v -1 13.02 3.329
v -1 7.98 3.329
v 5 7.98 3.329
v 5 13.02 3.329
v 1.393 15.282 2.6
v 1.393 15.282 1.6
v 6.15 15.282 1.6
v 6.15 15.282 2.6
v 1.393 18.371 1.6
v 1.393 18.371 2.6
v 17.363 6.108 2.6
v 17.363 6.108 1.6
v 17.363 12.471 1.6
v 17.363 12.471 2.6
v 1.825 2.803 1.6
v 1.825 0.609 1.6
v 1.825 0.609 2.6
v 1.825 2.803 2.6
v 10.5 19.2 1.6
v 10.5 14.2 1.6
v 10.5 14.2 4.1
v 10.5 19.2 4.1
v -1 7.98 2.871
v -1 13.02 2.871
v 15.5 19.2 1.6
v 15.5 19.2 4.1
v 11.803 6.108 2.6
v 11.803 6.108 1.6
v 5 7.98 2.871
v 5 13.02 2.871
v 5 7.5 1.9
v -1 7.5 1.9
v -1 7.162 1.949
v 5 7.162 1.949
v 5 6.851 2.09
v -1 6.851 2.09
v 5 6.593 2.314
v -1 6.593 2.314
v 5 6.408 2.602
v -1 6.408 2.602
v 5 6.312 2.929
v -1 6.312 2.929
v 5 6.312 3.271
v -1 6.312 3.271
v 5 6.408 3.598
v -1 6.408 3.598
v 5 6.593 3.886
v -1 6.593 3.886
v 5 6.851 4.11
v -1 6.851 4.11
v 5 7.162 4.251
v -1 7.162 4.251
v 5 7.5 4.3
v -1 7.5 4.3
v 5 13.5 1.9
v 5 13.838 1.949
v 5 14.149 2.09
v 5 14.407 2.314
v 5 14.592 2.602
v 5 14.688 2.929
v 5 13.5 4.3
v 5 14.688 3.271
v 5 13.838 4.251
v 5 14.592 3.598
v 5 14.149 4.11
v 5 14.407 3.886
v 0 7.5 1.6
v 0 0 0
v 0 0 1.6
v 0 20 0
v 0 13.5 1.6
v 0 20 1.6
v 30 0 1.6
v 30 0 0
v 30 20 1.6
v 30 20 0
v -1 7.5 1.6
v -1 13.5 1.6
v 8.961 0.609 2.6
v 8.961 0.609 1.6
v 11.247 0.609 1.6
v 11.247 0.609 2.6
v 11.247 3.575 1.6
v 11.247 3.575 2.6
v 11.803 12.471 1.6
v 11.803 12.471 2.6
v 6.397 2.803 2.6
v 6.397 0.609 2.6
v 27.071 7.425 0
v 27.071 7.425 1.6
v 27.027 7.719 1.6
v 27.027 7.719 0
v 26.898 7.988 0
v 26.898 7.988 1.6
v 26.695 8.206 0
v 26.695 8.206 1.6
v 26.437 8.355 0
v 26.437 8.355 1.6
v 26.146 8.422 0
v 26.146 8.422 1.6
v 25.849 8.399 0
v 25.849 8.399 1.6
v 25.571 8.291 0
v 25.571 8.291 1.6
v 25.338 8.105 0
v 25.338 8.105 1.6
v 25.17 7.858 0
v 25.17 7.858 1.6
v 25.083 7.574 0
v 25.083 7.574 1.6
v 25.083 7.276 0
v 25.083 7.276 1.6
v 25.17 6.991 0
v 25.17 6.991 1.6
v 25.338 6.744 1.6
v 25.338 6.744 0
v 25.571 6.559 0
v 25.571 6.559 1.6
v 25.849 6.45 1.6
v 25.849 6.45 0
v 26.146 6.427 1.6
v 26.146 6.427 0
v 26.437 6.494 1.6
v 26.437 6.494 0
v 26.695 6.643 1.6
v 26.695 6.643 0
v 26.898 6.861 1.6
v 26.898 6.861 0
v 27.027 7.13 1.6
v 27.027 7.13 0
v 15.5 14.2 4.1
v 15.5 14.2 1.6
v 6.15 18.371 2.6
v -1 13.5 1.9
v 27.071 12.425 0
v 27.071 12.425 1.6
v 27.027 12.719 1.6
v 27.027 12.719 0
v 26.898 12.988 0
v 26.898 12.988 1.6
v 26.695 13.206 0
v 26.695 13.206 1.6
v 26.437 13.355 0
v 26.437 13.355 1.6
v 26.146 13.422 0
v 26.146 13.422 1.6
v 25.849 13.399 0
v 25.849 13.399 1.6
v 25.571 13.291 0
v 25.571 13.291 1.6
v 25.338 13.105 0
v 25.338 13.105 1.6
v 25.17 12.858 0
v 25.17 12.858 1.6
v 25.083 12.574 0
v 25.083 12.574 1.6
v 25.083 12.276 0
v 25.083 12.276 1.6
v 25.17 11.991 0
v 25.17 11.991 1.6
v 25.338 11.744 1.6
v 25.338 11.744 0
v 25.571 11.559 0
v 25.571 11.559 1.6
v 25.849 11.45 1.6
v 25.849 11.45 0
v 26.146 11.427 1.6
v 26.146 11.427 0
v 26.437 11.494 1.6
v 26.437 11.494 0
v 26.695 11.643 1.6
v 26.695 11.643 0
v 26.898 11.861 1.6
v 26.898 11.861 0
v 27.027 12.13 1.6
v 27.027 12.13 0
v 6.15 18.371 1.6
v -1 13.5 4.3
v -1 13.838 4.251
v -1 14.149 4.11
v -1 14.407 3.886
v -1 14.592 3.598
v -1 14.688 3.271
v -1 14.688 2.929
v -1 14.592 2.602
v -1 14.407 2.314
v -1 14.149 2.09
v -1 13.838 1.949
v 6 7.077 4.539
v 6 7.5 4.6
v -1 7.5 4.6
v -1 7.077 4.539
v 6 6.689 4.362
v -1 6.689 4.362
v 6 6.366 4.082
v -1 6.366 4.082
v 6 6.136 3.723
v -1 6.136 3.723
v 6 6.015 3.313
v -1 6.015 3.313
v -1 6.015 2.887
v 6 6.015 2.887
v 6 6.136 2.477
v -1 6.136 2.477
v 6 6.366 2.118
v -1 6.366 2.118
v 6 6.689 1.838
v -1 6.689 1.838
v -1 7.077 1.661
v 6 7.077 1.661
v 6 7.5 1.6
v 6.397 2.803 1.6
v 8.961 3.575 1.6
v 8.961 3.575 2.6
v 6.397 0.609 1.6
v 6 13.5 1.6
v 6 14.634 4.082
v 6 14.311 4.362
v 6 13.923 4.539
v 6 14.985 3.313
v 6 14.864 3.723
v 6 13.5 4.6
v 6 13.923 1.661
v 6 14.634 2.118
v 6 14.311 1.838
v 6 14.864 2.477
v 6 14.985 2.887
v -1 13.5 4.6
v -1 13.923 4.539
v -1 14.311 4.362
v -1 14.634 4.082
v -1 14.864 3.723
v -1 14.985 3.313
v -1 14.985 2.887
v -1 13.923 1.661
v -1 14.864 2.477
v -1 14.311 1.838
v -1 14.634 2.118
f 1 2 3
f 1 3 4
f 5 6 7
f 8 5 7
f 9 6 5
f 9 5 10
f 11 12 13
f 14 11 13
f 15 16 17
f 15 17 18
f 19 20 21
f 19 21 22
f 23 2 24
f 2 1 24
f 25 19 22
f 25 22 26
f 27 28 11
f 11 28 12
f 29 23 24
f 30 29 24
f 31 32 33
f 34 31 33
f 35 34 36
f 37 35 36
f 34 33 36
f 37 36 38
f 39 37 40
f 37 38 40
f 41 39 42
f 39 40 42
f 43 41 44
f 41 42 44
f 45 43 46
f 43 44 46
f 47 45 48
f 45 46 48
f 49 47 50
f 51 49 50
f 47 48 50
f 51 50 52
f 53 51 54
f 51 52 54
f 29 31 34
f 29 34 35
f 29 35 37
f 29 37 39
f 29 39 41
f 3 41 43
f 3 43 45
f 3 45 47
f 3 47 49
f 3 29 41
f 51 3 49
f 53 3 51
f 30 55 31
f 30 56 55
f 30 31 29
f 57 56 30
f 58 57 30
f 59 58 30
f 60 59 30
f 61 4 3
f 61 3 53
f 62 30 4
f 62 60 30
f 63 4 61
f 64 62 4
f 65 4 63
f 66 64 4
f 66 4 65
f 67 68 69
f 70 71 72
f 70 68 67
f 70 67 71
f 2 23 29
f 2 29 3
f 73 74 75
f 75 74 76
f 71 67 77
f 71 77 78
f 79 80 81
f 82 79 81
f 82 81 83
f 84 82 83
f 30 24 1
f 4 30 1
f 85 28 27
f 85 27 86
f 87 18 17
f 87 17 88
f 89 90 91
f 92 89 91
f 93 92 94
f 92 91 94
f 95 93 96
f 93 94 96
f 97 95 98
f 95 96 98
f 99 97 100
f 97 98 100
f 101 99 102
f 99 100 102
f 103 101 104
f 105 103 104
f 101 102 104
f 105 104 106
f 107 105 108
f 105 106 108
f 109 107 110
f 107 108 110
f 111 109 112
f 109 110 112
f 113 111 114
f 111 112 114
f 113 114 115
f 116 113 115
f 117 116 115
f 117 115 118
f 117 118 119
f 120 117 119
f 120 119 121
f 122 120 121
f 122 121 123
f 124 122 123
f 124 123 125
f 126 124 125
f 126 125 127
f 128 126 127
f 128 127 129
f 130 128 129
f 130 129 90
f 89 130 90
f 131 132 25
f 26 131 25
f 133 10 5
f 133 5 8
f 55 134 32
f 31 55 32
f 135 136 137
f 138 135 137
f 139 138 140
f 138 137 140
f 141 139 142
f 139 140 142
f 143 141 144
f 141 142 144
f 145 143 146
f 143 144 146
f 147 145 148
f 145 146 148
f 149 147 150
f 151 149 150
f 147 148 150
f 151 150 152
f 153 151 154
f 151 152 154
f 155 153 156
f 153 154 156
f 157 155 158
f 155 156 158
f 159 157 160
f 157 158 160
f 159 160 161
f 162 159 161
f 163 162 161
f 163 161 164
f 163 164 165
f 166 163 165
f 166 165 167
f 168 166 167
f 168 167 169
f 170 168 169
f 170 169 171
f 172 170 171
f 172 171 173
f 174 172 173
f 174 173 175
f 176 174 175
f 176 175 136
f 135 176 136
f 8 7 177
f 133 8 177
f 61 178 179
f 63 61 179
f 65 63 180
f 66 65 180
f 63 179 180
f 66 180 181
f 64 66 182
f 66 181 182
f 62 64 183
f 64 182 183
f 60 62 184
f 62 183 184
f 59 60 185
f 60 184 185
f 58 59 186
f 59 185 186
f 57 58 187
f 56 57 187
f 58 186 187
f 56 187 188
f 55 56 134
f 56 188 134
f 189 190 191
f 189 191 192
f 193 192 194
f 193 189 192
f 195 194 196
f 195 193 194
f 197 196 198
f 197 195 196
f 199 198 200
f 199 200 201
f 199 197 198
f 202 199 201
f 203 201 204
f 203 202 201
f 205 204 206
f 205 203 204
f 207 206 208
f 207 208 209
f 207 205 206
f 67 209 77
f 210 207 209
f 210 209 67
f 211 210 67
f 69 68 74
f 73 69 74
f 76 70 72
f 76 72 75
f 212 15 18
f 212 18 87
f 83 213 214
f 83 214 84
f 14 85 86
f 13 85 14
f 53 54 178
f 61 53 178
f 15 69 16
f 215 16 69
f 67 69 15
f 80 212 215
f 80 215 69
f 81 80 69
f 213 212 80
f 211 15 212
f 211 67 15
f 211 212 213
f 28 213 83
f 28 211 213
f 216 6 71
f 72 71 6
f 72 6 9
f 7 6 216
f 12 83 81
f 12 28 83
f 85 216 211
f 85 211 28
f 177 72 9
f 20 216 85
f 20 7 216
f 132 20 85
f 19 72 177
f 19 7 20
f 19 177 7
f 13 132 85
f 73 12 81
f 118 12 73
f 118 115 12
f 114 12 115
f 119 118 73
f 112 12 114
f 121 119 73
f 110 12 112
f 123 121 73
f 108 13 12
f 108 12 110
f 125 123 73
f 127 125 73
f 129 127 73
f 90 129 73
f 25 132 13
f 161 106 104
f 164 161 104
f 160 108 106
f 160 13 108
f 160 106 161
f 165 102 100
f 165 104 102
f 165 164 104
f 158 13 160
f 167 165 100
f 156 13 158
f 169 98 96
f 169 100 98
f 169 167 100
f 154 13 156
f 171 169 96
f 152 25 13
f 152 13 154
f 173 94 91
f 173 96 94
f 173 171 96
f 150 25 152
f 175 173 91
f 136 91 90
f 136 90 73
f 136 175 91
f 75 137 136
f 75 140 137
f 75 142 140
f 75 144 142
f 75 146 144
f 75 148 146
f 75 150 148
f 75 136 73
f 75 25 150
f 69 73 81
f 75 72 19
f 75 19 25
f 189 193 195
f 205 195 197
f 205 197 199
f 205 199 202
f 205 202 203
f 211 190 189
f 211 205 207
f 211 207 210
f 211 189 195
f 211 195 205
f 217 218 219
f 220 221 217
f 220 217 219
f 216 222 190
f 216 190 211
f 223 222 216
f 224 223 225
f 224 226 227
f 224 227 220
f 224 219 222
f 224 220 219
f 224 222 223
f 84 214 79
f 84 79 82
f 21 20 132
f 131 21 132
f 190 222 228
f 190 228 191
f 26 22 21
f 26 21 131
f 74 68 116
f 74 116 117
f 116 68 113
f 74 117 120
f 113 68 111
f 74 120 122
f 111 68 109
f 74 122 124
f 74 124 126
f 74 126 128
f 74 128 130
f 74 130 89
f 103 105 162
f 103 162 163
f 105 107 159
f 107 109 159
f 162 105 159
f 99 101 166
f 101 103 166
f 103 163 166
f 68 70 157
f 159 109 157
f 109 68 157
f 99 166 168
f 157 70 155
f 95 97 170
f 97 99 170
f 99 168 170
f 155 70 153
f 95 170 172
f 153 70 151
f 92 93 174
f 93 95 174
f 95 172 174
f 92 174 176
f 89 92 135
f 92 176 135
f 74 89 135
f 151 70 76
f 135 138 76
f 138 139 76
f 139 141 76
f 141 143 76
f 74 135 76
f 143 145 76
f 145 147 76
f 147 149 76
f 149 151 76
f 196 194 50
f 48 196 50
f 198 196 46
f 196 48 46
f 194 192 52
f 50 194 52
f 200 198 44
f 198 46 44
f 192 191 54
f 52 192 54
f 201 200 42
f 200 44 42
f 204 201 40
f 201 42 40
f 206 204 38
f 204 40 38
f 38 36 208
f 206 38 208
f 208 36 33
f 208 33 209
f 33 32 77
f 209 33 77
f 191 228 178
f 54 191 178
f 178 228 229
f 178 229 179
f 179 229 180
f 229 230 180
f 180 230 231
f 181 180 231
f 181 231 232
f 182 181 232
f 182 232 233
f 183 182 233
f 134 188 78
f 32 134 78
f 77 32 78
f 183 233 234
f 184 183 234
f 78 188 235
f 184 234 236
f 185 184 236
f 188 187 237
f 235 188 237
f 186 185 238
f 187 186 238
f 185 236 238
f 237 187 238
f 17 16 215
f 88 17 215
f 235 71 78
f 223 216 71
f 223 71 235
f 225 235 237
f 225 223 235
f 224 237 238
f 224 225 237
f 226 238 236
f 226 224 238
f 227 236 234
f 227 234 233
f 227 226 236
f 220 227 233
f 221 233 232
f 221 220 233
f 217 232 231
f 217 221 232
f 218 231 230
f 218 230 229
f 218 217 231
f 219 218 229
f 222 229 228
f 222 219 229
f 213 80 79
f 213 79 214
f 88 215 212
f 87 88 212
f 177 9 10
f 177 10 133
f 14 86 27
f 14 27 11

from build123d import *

# Parameters (mm, degrees)
SKICA1_W                     = 30
SKICA1_H                     = 20
P_IDAT_VYSUNUT_M1_DEPTH      = 1.6
SKICA2_W                     = 5
SKICA2_H                     = 5
P_IDAT_VYSUNUT_M2_DEPTH      = 2.5
SKICA3_W                     = 5.560208965
SKICA3_H                     = 6.363350261
SKICA3_W_2                   = 2.285863686
SKICA3_H_2                   = 2.965444781
SKICA3_W_3                   = 4.571727371
SKICA3_H_3                   = 2.193193536
SKICA3_W_4                   = 4.75706767
SKICA3_H_4                   = 3.089004981
P_IDAT_VYSUNUT_M3_DEPTH      = 1
SKICA4_R                     = 1
ODEBRAT_VYSUNUT_M1_DEPTH     = 11
P_IDAT_VYSUNUT_M4_DEPTH      = 1
P_IDAT_VYSUNUT_M4_DEPTH_BACK = 6
SKICA6_W                     = 0.458188224
SKICA6_H                     = 5.040283318
ODEBRAT_VYSUNUT_M2_DEPTH     = 6


with BuildPart() as part:
    # Skica1 → Přidat vysunutím1 (new body)
    with BuildSketch(Plane.XY):
        with Locations((15, 10)):
            Rectangle(SKICA1_W, SKICA1_H)
    extrude(amount=P_IDAT_VYSUNUT_M1_DEPTH)

    # Skica2 → Přidat vysunutím2 (add)
    with BuildSketch(Plane.XY.offset(1.6)):
        with Locations((13, 16.7)):
            Rectangle(SKICA2_W, SKICA2_H)
    extrude(amount=P_IDAT_VYSUNUT_M2_DEPTH)

    # Skica3 → Přidat vysunutím3 (add)
    with BuildSketch(Plane.XY.offset(1.6)):
        with Locations((14.582984328, 9.289528855)):
            Rectangle(SKICA3_W, SKICA3_H)
        with Locations((10.103927106, 2.092147249)):
            Rectangle(SKICA3_W_2, SKICA3_H_2)
        with Locations((4.111257444, 1.706021627)):
            Rectangle(SKICA3_W_3, SKICA3_H_3)
        with Locations((3.771466895, 16.826701007)):
            Rectangle(SKICA3_W_4, SKICA3_H_4)
    extrude(amount=P_IDAT_VYSUNUT_M3_DEPTH)

    # Skica4 → Odebrat vysunutím1 (cut)
    with BuildSketch(Plane.XY.offset(1.6)):
        with Locations((26.071400283, 12.424560679)):
            Circle(SKICA4_R)
        with Locations((26.071400283, 7.424560679)):
            Circle(SKICA4_R)
    extrude(amount=-ODEBRAT_VYSUNUT_M1_DEPTH, mode=Mode.SUBTRACT)

    # Skica5 → Přidat vysunutím4 (add, two sides: drawn at the far end of the back side and taken through both)
    with BuildSketch(Plane.ZY.offset(-P_IDAT_VYSUNUT_M4_DEPTH_BACK)):
        with BuildLine():
            Line((4.6, 13.5), (4.6, 7.5))
            ThreePointArc((4.6, 7.5), (3.1, 6), (1.6, 7.5))
            Line((1.6, 7.5), (1.6, 13.5))
            ThreePointArc((1.6, 13.5), (3.1, 15), (4.6, 13.5))
        make_face()
    extrude(amount=P_IDAT_VYSUNUT_M4_DEPTH + P_IDAT_VYSUNUT_M4_DEPTH_BACK)

    # Skica6 → Odebrat vysunutím2 (cut)
    with BuildSketch(Plane.ZY.offset(1)):
        with BuildLine():
            Line((1.9, 13.5), (1.9, 7.5))
            ThreePointArc((1.9, 7.5), (3.1, 6.3), (4.3, 7.5))
            Line((4.3, 7.5), (4.3, 13.5))
            ThreePointArc((4.3, 13.5), (3.1, 14.7), (1.9, 13.5))
        make_face()
        with Locations((3.1, 10.5)):
            Rectangle(SKICA6_W, SKICA6_H, mode=Mode.SUBTRACT)
    extrude(amount=-ODEBRAT_VYSUNUT_M2_DEPTH, mode=Mode.SUBTRACT)


solid = part.part
